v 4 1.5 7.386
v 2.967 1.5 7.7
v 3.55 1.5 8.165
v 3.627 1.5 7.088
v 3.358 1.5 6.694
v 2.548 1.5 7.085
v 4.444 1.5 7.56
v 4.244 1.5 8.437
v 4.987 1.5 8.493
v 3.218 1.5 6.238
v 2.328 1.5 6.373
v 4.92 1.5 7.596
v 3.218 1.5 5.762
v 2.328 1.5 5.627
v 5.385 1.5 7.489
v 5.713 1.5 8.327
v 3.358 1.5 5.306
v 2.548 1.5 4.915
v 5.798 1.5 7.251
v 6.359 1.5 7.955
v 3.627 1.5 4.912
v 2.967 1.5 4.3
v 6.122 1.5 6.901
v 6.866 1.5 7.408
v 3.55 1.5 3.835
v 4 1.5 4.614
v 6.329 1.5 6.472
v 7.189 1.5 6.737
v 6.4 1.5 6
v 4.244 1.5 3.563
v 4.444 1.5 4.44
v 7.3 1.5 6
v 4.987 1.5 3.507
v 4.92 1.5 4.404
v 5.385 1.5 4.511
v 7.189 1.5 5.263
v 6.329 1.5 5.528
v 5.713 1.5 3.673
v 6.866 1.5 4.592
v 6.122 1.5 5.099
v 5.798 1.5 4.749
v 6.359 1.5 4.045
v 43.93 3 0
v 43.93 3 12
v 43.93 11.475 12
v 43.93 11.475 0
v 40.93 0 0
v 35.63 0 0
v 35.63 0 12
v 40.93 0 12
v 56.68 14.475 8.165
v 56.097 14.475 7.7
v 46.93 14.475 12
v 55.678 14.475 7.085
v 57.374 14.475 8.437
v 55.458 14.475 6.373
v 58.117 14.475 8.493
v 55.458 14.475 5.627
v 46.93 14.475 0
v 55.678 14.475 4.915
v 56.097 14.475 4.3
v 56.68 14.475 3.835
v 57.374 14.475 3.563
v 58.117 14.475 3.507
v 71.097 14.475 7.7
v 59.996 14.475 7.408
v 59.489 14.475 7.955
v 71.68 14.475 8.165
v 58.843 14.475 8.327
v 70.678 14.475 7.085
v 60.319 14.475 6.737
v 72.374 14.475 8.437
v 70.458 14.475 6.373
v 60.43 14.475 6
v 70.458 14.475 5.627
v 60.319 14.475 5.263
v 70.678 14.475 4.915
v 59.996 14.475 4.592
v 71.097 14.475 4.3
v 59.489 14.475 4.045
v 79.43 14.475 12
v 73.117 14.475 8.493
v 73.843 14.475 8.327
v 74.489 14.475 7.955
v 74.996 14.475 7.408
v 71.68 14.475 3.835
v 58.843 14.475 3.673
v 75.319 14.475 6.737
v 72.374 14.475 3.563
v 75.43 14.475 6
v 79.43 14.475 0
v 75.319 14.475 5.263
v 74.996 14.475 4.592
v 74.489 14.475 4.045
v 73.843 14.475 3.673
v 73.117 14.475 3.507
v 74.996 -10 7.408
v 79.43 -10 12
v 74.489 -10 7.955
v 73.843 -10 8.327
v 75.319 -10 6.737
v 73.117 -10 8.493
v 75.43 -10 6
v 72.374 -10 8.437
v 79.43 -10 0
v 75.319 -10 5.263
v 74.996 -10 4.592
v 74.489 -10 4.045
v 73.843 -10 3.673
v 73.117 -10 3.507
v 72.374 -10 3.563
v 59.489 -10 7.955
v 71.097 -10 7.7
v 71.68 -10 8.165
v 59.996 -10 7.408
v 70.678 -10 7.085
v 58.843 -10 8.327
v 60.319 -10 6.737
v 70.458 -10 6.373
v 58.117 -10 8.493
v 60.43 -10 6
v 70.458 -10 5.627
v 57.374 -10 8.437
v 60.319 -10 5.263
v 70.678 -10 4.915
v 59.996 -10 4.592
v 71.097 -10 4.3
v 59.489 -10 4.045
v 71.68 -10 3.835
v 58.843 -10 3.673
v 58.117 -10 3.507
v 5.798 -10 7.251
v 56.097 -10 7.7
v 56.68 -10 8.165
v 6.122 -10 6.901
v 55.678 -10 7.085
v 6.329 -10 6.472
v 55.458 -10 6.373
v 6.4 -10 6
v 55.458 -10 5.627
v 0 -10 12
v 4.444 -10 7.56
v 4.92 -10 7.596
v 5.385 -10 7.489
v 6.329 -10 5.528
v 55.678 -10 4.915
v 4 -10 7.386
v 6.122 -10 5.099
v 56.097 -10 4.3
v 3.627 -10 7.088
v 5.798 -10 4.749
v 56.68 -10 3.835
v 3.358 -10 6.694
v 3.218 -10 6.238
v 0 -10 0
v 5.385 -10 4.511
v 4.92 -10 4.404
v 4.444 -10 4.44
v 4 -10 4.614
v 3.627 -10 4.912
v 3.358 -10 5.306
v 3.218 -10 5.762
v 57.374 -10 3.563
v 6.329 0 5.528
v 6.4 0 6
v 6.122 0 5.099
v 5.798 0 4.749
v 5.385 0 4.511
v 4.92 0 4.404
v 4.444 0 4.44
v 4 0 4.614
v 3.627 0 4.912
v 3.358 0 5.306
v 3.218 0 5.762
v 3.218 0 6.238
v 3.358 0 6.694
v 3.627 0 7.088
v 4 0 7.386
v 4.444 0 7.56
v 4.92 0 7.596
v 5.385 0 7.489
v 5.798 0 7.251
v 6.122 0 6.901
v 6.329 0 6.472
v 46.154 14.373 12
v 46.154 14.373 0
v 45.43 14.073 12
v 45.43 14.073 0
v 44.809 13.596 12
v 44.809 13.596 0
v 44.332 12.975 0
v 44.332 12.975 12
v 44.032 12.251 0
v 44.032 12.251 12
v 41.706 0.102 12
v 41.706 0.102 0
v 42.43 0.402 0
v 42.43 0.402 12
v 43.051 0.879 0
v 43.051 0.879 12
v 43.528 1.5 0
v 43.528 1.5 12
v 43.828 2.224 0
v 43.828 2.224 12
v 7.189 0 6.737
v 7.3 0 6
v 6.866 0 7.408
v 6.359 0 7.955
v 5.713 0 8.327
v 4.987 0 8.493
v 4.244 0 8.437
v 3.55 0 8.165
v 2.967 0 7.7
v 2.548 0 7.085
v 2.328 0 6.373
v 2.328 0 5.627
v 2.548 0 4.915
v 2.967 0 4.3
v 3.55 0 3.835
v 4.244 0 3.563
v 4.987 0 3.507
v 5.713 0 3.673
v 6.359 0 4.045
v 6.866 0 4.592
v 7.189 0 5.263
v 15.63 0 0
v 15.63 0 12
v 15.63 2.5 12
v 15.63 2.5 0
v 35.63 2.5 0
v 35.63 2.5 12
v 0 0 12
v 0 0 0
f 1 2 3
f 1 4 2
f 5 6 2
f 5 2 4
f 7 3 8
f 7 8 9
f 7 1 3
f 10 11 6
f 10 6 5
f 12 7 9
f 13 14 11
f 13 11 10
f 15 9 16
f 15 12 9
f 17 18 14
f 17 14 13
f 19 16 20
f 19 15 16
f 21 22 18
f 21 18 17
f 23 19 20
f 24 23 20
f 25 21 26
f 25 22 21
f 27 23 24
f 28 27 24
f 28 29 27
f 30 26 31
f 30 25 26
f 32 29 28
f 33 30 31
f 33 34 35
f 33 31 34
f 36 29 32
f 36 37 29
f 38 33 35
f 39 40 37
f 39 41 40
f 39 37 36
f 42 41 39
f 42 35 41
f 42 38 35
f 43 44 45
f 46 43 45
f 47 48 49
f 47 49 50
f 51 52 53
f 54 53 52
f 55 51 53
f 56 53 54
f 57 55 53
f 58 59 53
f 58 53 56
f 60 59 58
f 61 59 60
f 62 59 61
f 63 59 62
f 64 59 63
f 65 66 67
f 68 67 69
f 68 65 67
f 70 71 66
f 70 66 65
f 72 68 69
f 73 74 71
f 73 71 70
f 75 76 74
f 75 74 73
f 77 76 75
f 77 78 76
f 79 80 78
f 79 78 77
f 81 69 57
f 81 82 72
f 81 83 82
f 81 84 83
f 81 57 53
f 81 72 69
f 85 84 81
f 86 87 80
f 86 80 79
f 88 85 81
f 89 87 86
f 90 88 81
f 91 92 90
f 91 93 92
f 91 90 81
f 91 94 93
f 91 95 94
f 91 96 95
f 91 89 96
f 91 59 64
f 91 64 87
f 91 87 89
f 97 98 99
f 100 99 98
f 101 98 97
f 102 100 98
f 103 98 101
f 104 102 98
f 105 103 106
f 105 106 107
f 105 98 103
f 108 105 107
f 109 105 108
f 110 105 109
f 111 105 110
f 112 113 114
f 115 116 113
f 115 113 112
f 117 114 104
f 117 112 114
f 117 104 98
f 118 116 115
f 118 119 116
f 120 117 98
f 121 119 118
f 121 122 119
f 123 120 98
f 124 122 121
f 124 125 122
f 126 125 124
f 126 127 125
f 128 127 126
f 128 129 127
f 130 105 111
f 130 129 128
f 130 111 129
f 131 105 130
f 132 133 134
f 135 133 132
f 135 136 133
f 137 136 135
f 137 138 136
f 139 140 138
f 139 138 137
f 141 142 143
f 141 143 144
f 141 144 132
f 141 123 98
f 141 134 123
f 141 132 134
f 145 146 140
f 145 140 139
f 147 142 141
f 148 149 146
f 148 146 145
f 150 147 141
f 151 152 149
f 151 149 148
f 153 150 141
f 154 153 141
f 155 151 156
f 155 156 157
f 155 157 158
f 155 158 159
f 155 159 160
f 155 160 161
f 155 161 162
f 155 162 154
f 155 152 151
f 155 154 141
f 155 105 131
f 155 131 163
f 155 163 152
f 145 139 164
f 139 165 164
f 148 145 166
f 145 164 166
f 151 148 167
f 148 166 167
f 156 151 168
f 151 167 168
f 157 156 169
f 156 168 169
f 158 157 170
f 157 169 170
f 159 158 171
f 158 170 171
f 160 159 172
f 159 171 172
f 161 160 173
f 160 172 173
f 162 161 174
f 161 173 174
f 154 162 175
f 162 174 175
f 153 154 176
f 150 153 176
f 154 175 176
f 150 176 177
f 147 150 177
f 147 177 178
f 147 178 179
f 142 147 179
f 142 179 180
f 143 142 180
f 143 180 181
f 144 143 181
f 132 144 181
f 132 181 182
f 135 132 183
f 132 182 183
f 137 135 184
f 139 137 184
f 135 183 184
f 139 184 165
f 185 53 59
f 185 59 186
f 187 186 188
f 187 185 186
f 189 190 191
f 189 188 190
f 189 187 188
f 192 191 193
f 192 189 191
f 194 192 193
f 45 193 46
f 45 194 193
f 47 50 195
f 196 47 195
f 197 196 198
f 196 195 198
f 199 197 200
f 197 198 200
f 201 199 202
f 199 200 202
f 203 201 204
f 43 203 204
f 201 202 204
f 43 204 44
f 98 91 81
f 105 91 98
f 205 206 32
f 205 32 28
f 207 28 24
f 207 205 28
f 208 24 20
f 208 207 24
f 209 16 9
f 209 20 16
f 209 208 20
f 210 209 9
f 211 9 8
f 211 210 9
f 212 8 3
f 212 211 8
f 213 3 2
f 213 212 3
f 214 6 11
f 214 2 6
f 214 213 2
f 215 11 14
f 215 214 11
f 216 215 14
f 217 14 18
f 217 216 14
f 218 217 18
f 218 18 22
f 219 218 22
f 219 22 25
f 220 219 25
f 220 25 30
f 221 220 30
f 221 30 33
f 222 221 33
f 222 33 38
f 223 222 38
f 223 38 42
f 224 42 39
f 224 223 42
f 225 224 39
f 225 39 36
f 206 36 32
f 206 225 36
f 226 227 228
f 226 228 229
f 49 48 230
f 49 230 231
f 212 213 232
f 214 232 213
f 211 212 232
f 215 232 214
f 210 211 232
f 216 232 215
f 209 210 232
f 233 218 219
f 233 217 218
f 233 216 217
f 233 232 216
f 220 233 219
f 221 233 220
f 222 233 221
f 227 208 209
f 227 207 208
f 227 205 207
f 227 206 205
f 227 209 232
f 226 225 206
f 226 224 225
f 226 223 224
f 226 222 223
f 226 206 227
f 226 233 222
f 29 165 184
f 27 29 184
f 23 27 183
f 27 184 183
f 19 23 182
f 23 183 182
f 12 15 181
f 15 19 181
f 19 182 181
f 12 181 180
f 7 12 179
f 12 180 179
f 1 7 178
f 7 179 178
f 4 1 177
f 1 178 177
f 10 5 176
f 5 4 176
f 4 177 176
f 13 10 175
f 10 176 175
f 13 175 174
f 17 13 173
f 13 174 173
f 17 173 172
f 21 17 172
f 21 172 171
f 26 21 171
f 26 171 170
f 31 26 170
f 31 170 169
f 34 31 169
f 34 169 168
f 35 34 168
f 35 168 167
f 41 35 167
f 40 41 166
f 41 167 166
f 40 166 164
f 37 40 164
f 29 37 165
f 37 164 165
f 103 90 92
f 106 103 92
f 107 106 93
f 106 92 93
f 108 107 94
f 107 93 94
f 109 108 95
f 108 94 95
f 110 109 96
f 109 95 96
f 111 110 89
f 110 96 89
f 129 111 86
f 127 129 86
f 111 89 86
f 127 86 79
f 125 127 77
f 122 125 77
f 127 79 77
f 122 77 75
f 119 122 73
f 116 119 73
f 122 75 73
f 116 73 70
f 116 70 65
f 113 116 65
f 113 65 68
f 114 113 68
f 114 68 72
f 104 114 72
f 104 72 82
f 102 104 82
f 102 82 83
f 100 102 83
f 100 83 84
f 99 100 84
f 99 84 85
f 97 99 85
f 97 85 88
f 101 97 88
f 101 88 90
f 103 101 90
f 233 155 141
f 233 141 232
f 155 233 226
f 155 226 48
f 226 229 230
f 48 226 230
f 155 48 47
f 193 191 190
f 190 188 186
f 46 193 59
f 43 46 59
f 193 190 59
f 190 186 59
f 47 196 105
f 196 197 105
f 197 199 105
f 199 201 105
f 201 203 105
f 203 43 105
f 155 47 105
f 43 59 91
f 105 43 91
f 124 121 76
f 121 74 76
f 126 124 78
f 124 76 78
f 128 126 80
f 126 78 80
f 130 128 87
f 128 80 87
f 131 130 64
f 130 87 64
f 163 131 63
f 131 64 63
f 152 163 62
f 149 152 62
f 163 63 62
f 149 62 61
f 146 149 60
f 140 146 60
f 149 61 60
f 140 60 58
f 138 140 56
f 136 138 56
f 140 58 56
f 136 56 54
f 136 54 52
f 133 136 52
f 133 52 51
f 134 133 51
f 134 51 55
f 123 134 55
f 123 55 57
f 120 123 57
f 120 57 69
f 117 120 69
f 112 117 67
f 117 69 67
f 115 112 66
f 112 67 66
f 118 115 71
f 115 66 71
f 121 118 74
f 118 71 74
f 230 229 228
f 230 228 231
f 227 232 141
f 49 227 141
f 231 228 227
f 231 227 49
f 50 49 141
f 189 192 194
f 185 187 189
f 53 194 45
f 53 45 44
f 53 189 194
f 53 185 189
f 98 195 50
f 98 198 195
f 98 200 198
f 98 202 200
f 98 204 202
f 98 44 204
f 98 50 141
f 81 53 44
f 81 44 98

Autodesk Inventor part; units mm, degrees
ref_plane "YZ Plane" through (0, 0, 0) normal (1, 0, 0) x (0, 1, 0)
ref_plane "XZ Plane" through (0, 0, 0) normal (0, 1, 0) x (-1, 0, 0)
ref_plane "XY Plane" through (0, 0, 0) normal (0, 0, 1) x (1, 0, 0)
sketch "Sketch1" plane through (0, 0, 0) normal (0, 0, 1) x (1, 0, 0)
  line L0 (0, 0) -> (79.43, 0)
  line L1 (79.43, 0) -> (79.43, -10)
  line L2 (79.43, -10) -> (0, -10)
  line L3 (0, -10) -> (0, 0)
  line L4 (79.43, 0) -> (43.93, 0)
  line L5 (43.93, 0) -> (43.93, 14.475)
  line L6 (43.93, 14.475) -> (79.43, 14.475)
  line L7 (79.43, 14.475) -> (79.43, 0)
  line L8 (3.2, 0) -> (6.4, 0) construction
  line L9 (6.4, 0) -> (6.4, -10) construction
  line L10 (6.4, -10) -> (3.2, -10) construction
  line L11 (3.2, -10) -> (3.2, 0) construction
  line L12 (4.8, 0) -> (4.8, -10) construction
  line L13 (55.93, 14.475) -> (55.93, -10) construction
  line L14 (70.93, 14.475) -> (70.93, -10) construction
  line L15 (53.43, 14.475) -> (58.43, 14.475) construction
  line L16 (58.43, 14.475) -> (58.43, -10) construction
  line L17 (58.43, -10) -> (53.43, -10) construction
  line L18 (53.43, -10) -> (53.43, 14.475) construction
  line L19 (68.43, 14.475) -> (73.43, 14.475) construction
  line L20 (73.43, 14.475) -> (73.43, -10) construction
  line L21 (73.43, -10) -> (68.43, -10) construction
  line L22 (68.43, -10) -> (68.43, 14.475) construction
  dimension "d0" = 14.475
  dimension "d3" = 3.2
  dimension "d4" = 3.2
  dimension "d6" = 39.13
  dimension "d34" = 10
  dimension "d35" = 5
  dimension "d36" = 5
  dimension "d37" = 2.5
  dimension "d38" = 2.5
  dimension "d39" = 12
  dimension "d40" = 10
  dimension "d41" = 6
extrude "Extrusion1" add sketch "Sketch1" along normal blind 12
sketch "Sketch2" plane through (43.93, 14.475, 0) normal (0, 1, 0) x (1, 0, 0)
  line L0 (35.5, 0) -> (0, 0) projected
  line L1 (0, 0) -> (0, -12) projected
  line L2 (35.5, -12) -> (0, -12) projected
  line L3 (35.5, 0) -> (35.5, -12) projected
  line L4 (0, 0) -> (0, -12) projected
  line L5 (0, 0) -> (-43.93, 0) projected
  line L6 (-43.93, 0) -> (-43.93, -12) projected
  line L7 (0, -12) -> (-43.93, -12) projected
  circle A0 centre (-39.13, -6) radius 1.6
  circle A1 centre (29, -6) radius 2.5
  circle A2 centre (14, -6) radius 2.5
  dimension "d15" = 3.2
  dimension "d16" = 5
  dimension "d17" = 5
  dimension "d22" = 12
  dimension "d23" = 6
  dimension "d24" = 6
  dimension "d26" = 3.2
  dimension "d42" = 14
  dimension "d43" = 10
extrude "Extrusion2" cut sketch "Sketch2" against normal up to surface (24.475 mm away) contours A0 | A1 | A2
fillet "Fillet1" radius 3 2 edges at (43.93, 14.475, 6) (43.93, 0, 6)
sketch "Sketch3" plane through (0, 0, 12) normal (0, 1, 0) x (1, 0, 0)
  line L0 (40.93, 12) -> (40.93, 0) projected
  line L1 (40.93, 12) -> (0, 12) projected
  line L2 (0, 12) -> (0, 0) projected
  line L3 (40.93, 0) -> (0, 0) projected
  circle A0 centre (4.8, 6) radius 1.6 projected
  circle A1 centre (4.8, 6) radius 2.5
  circle A2 centre (4.8, 6) radius 1.6
  circle A3 centre (4.8, 6) radius 1.6 projected
  dimension "d31" = 5
extrude "Extrusion3" add sketch "Sketch3" along normal blind 1.5 contours A1
sketch "Sketch4" plane through (0, 0, 12) normal (0, 1, 0) x (1, 0, 0)
  line L0 (43.93, 0) -> (43.93, 12) projected
  line L1 (43.93, 12) -> (43.93, 0) projected
  circle A0 centre (4.8, 6) radius 2.5 projected
  line L2 (40.93, 12) -> (40.93, 0) projected
  line L3 (40.93, 12) -> (0, 12) projected
  line L4 (0, 12) -> (0, 0) projected
  line L5 (40.93, 0) -> (0, 0) projected
  line L6 (43.93, 12) -> (43.93, 0) projected
  line L7 (43.93, 0) -> (43.93, 12) projected
  line L8 (0, 12) -> (79.43, 12) projected
  line L9 (15.63, 12) -> (35.63, 12)
  line L10 (35.63, 12) -> (35.63, 0)
  line L11 (35.63, 0) -> (15.63, 0)
  line L12 (15.63, 0) -> (15.63, 12)
  dimension "d44" = 8.3
  dimension "d45" = 20
extrude "Extrusion4" add sketch "Sketch4" along normal blind 2.5 contours L10 L5 L12 L3
equation "\"d37\" = 0.5 * d35"
equation "\"d38\" = 0.5 * d36"
properties part number "BottomWheelHolder"
